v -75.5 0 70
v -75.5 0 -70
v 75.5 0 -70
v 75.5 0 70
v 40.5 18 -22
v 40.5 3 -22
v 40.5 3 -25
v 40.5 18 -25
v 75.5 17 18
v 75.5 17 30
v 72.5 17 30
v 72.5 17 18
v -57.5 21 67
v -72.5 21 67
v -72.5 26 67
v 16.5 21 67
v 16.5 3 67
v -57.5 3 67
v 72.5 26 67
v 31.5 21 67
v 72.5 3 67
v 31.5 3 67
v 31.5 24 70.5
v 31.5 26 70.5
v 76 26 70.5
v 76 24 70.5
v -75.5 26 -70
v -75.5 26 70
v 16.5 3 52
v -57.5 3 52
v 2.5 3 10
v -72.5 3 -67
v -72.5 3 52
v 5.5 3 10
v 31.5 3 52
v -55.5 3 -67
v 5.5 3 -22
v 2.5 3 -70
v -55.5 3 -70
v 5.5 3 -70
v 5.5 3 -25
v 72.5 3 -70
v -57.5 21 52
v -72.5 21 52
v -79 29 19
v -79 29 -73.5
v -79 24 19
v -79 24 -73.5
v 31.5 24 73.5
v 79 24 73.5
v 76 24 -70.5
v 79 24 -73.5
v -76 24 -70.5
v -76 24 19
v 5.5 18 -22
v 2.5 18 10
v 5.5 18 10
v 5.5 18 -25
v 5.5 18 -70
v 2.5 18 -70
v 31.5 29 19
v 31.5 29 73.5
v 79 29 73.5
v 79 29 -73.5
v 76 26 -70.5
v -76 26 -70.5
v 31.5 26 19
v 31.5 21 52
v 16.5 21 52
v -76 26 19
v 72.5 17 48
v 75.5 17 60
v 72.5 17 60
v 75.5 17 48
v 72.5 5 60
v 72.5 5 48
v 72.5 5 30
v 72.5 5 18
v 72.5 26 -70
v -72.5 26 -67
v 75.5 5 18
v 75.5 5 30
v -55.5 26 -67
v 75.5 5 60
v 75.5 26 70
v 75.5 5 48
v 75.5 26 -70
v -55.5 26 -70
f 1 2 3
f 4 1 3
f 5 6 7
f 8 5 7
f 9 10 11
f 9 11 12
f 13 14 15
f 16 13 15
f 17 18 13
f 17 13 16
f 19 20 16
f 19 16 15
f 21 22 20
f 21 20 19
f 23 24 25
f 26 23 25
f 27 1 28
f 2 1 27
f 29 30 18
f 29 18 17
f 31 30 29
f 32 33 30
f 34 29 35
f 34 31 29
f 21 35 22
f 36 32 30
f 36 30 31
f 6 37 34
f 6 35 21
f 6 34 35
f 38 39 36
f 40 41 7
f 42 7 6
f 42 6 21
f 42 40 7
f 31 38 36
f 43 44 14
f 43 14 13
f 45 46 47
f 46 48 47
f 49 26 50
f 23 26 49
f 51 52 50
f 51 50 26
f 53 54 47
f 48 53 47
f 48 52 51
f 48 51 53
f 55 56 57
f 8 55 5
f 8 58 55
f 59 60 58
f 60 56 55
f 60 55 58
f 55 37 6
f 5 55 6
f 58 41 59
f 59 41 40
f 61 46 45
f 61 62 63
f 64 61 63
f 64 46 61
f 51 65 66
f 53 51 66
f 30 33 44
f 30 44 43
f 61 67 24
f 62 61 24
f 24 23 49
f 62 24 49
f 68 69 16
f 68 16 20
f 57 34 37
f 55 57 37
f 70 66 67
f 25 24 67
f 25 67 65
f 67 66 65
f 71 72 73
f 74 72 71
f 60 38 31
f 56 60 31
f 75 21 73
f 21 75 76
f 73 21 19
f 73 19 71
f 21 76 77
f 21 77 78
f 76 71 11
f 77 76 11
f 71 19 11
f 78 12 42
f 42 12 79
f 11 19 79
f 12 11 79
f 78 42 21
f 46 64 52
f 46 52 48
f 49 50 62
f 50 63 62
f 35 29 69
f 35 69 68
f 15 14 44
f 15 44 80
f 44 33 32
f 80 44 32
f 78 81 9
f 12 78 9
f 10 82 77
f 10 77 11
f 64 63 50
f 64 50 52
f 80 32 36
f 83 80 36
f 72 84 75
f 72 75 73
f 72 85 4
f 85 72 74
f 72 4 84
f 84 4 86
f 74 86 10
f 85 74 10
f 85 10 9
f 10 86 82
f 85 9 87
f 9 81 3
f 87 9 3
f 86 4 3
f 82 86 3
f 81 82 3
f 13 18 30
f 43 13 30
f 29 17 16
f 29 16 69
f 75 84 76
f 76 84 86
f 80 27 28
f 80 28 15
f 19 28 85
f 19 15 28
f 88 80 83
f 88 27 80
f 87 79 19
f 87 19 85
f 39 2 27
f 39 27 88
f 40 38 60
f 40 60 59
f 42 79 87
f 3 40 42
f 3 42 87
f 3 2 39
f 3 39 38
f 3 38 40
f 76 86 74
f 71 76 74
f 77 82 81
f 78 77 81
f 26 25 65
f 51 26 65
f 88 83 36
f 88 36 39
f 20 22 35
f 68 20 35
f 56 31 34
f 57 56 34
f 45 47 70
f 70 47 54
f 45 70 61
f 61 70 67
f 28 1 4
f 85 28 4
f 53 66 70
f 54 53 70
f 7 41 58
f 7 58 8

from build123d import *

# Parameters (mm, degrees)
SKETCH2_W           = 151
SKETCH2_H           = 140
SKETCH2_W_2         = 145
SKETCH2_H_2         = 134
BOSS_EXTRUDE1_DEPTH = 26
SKETCH2_2_W         = 145
SKETCH2_2_H         = 134
BOSS_EXTRUDE2_DEPTH = 3
SKETCH3_W           = 128
SKETCH3_H           = 3
CUT_EXTRUDE1_DEPTH  = 23
SKETCH4_W           = 12
SKETCH4_H           = 12
CUT_EXTRUDE2_DEPTH  = 23
BOSS_EXTRUDE3_DEPTH = 15
SKETCH6_W           = 15
SKETCH6_H           = 15
BOSS_EXTRUDE4_DEPTH = 18
BOSS_EXTRUDE5_DEPTH = 3
SKETCH8_W           = 3
SKETCH8_H           = 92.5
BOSS_EXTRUDE6_DEPTH = 2
SKETCH9_W           = 155
SKETCH9_H           = 3
BOSS_EXTRUDE7_DEPTH = 2


with BuildPart() as part:
    # Sketch2 → Boss-Extrude1 (new body)
    with BuildSketch(Plane(origin=(0, 0, 0), x_dir=(1, 0, 0), z_dir=(0, 1, 0))):
        Rectangle(SKETCH2_W, SKETCH2_H)
        Rectangle(SKETCH2_W_2, SKETCH2_H_2, mode=Mode.SUBTRACT)
    extrude(amount=BOSS_EXTRUDE1_DEPTH)

    # Sketch2<2> → Boss-Extrude2 (add)
    with BuildSketch(Plane(origin=(0, 0, 0), x_dir=(1, 0, 0), z_dir=(0, 1, 0))):
        Rectangle(SKETCH2_2_W, SKETCH2_2_H)
    extrude(amount=BOSS_EXTRUDE2_DEPTH)

    # Sketch3 → Cut-Extrude1 (cut)
    with BuildSketch(Plane(origin=(0, 26, 0), x_dir=(1, 0, 0), z_dir=(0, 1, 0))):
        with Locations((8.5, 68.5)):
            Rectangle(SKETCH3_W, SKETCH3_H)
    extrude(amount=-CUT_EXTRUDE1_DEPTH, mode=Mode.SUBTRACT)

    # Sketch4 → Cut-Extrude2 (cut)
    with BuildSketch(Plane(origin=(75.5, 0, 0), x_dir=(0, 0, -1), z_dir=(1, 0, 0))):
        with Locations((-54, 11)):
            Rectangle(SKETCH4_W, SKETCH4_H)
        with Locations((-24, 11)):
            Rectangle(SKETCH4_W, SKETCH4_H)
    extrude(amount=-CUT_EXTRUDE2_DEPTH, mode=Mode.SUBTRACT)

    # Sketch5 → Boss-Extrude3 (add)
    with BuildSketch(Plane(origin=(0, 3, 0), x_dir=(1, 0, 0), z_dir=(0, 1, 0))):
        Polygon((5.5, 70), (2.5, 70), (2.5, -10), (5.5, -10), (5.5, 22), (40.5, 22), (40.5, 25), (5.5, 25), align=None)
    extrude(amount=BOSS_EXTRUDE3_DEPTH)

    # Sketch6 → Boss-Extrude4 (add)
    with BuildSketch(Plane(origin=(0, 3, 0), x_dir=(1, 0, 0), z_dir=(0, 1, 0))):
        with Locations((-65, -59.5)):
            Rectangle(SKETCH6_W, SKETCH6_H)
        with Locations((24, -59.5)):
            Rectangle(SKETCH6_W, SKETCH6_H)
    extrude(amount=BOSS_EXTRUDE4_DEPTH)


with BuildPart() as body_2:
    # Sketch7 → Boss-Extrude5 (new body)
    with BuildSketch(Plane(origin=(0, 26, 0), x_dir=(1, 0, 0), z_dir=(0, 1, 0))):
        Polygon((79, 73.5), (-79, 73.5), (-79, -19), (31.5, -19), (31.5, -73.5), (79, -73.5), align=None)
    extrude(amount=BOSS_EXTRUDE5_DEPTH)

    # Sketch8 → Boss-Extrude6 (add)
    with BuildSketch(Plane.XZ.offset(-26)):
        with Locations((-77.5, -27.25)):
            Rectangle(SKETCH8_W, SKETCH8_H)
        Polygon((76, 70.5), (76, -70.5), (79, -70.5), (79, 73.5), (31.5, 73.5), (31.5, 70.5), align=None)
    extrude(amount=BOSS_EXTRUDE6_DEPTH)

    # Sketch9 → Boss-Extrude7 (add)
    with BuildSketch(Plane(origin=(0, 26, 0), x_dir=(-1, 0, 0), z_dir=(0, -1, 0))):
        with Locations((-1.5, 72)):
            Rectangle(SKETCH9_W, SKETCH9_H)
    extrude(amount=BOSS_EXTRUDE7_DEPTH)


solid = Compound([part.part, body_2.part])
